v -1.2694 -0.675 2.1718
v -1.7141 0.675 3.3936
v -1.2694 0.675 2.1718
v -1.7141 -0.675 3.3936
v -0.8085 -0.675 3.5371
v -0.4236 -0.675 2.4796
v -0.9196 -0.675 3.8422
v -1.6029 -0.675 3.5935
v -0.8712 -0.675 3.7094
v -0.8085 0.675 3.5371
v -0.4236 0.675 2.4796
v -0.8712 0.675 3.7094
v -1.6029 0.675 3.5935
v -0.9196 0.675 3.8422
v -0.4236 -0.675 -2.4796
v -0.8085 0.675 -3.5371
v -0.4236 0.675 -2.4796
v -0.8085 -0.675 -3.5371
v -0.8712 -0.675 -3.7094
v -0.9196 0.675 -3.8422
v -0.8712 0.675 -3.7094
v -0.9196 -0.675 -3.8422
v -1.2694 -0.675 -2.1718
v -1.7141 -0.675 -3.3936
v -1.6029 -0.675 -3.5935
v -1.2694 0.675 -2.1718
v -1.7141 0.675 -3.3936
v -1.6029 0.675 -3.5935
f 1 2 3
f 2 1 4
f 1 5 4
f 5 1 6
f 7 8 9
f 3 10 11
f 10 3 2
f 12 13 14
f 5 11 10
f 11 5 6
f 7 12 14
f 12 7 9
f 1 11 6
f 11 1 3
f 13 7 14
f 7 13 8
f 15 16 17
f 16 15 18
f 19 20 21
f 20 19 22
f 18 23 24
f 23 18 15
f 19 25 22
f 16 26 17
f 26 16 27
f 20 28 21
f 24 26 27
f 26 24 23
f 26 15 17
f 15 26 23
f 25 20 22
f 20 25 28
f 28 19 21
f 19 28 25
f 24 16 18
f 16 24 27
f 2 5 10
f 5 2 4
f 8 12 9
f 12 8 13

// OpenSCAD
$fn=64;

bbox_x = 3.0;
bbox_y = 1.2;
bbox_z = 9.0;

arc_angle = 220;          // degrees, C-shaped opening
r_mid = 3.2;              // mid radius to fit within 9mm length
radial_thk = 1.2;         // ring radial thickness
height_y = bbox_y;        // thickness in Y
inner_r = r_mid - radial_thk/2;
outer_r = r_mid + radial_thk/2;

tab_len = 0.9;            // along tangent direction
tab_radial_extra = 0.25;  // thickened ends
tab_y_extra = 0.15;

facet_n = 10;             // faceted outer surface
facet_depth = 0.18;

module ring_sector(r1, r2, ang, h){
    linear_extrude(height=h, center=true, convexity=10)
        difference(){
            circle(r=r2, $fn=128);
            circle(r=r1, $fn=128);
            rotate(ang/2) translate([0,0]) square([2*r2+2, 2*r2+2], center=true);
            rotate(-ang/2) translate([0,0]) square([2*r2+2, 2*r2+2], center=true);
        }
}

module end_tab(sign=1){
    a = sign*arc_angle/2;
    r_tab = outer_r + tab_radial_extra/2;
    translate([0,0,0])
    rotate([0,0,a])
    translate([r_mid,0,0])
    rotate([0,0,90])
    cube([tab_len, radial_thk + tab_radial_extra, height_y + tab_y_extra], center=true);
}

module faceted_outer(){
    for(i=[0:facet_n-1]){
        ang = -arc_angle/2 + (i+0.5)*arc_angle/facet_n;
        rotate([0,0,ang])
            translate([outer_r - facet_depth/2,0,0])
                cube([facet_depth, 2*(outer_r+2), height_y+2], center=true);
    }
}

module clamp_segment(){
    difference(){
        union(){
            ring_sector(inner_r, outer_r, arc_angle, height_y);
            end_tab(1);
            end_tab(-1);
        }
        // concave inner channel (slightly deeper than inner radius)
        ring_sector(0, inner_r + 0.05, arc_angle+2, height_y+0.4);
        // facet the outer surface
        faceted_outer();
        // trim to bounding box
        cube([bbox_x, bbox_y, bbox_z], center=true);
    }
}

rotate([90,0,0])  // make elongated along Z
clamp_segment();
